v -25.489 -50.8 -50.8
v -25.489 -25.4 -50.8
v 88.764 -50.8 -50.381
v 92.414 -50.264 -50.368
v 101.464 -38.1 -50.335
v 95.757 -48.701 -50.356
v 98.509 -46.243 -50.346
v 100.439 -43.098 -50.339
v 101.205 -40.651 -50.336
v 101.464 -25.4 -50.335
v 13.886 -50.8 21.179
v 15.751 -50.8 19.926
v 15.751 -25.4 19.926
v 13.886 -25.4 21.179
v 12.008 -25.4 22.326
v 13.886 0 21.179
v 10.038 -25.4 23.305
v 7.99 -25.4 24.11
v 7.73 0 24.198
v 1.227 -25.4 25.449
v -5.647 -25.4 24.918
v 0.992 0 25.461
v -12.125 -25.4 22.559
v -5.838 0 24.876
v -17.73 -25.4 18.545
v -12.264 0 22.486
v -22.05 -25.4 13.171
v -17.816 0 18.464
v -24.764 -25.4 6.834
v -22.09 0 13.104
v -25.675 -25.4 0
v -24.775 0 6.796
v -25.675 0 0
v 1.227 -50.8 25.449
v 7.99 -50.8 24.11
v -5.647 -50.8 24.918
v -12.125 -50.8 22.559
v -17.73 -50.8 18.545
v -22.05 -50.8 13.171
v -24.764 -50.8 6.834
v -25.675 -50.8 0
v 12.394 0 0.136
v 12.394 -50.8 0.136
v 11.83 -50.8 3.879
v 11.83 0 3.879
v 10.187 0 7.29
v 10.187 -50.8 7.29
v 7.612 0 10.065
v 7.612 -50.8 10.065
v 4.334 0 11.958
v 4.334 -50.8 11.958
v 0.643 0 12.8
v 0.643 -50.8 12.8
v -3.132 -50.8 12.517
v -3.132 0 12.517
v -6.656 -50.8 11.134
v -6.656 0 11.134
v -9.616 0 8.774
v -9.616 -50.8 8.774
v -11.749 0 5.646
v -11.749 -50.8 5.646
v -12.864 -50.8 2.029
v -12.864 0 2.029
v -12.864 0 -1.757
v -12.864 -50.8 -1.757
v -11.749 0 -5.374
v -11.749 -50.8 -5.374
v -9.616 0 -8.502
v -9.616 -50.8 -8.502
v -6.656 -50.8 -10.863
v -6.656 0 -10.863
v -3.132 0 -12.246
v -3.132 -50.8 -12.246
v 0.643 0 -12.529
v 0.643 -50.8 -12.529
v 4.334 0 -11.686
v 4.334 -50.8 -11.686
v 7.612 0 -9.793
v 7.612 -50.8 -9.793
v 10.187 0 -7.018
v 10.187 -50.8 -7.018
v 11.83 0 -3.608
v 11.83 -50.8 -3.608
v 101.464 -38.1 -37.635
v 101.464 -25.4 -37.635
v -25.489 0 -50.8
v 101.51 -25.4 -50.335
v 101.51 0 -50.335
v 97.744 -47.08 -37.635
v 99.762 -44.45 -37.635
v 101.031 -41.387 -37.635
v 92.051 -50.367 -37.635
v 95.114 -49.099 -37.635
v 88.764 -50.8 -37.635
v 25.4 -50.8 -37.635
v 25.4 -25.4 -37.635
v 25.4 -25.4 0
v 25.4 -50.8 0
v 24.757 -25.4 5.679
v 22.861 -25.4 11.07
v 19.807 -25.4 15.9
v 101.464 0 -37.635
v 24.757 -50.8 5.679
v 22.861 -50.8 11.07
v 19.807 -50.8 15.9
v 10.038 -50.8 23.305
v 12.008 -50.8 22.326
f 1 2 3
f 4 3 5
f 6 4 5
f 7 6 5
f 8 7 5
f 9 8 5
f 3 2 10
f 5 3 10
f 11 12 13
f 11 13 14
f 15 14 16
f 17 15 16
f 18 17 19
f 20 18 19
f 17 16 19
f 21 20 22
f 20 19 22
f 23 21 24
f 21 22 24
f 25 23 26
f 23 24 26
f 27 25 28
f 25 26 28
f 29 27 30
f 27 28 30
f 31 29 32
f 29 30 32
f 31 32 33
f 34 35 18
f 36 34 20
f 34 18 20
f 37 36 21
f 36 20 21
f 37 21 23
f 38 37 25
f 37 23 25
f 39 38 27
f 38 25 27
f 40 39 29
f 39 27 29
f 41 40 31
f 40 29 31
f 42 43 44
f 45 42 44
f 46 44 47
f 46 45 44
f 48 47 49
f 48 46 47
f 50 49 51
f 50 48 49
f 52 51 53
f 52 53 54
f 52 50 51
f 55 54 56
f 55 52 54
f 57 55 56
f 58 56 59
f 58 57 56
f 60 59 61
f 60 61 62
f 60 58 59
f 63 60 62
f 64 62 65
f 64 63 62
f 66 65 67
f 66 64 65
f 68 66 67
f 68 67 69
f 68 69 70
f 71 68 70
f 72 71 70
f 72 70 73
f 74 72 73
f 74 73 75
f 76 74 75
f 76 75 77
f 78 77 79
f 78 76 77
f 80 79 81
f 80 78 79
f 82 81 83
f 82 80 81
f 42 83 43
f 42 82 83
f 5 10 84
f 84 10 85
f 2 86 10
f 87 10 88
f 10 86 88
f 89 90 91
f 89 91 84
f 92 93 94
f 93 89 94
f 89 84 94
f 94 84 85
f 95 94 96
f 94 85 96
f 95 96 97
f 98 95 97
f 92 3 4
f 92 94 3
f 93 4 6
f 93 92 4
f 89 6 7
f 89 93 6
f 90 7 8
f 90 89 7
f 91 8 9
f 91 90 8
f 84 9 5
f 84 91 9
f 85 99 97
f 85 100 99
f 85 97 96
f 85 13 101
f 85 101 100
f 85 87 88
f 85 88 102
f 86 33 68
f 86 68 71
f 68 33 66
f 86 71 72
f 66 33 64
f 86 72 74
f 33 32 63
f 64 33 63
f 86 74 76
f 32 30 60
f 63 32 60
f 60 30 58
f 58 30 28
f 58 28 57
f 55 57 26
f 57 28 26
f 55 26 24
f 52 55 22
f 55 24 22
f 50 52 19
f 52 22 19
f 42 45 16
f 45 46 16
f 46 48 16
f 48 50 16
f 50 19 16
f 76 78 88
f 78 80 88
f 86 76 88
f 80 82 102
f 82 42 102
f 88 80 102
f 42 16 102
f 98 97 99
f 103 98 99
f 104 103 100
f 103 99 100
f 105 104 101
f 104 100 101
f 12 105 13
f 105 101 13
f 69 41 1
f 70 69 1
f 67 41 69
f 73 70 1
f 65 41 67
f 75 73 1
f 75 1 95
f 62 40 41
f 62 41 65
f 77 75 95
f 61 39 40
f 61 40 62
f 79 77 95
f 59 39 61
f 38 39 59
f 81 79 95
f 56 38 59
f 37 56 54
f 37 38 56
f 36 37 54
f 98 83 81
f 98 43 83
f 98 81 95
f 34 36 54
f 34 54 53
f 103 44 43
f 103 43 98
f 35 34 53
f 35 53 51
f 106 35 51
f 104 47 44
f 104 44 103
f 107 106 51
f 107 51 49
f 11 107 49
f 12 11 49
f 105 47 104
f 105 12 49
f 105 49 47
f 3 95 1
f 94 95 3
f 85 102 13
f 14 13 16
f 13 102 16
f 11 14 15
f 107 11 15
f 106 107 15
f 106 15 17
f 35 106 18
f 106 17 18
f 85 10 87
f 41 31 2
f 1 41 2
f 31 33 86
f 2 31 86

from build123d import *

# Parameters (mm, degrees)
F0_R     = 12.7
F1_DEPTH = 25.4
F2_R     = 12.7
F3_DEPTH = 25.4
F4_DEPTH = 25.4
F5_R     = 12.7


with BuildPart() as f1:
    # F0 (on Front) → F1 (new body)
    with BuildSketch(Plane.XZ):
        with BuildLine():
            Line((101.463508, -37.634854), (13.885502, 21.179284))
            ThreePointArc((13.885502, 21.179284), (-12.263588, 22.485844), (-25.675108, 0))
            Line((-25.675108, 0), (-25.489152, -50.79966))
            Line((-25.489152, -50.79966), (101.509997, -50.334769))
            Line((101.509997, -50.334769), (101.463508, -37.634854))
        make_face()
        with Locations((-0.306273, 0.13584)):
            Circle(F0_R, mode=Mode.SUBTRACT)
    extrude(amount=F1_DEPTH)

    # F2 (on face) → F3 (join)
    with BuildSketch(Plane.XZ.offset(25.4)):
        with BuildLine():
            Line((25.4, -37.634854), (25.4, 0))
            ThreePointArc((25.4, 0), (22.860903, 11.069738), (15.751252, 19.926316))
            Line((15.751252, 19.926316), (13.885502, 21.179284))
            ThreePointArc((13.885502, 21.179284), (11.033245, 22.836709), (7.990239, 24.110497))
            ThreePointArc((7.990239, 24.110497), (-15.064639, 20.743276), (-25.675108, 0))
            Line((-25.675108, 0), (-25.535641, -38.099745))
            Line((-25.535641, -38.099745), (-25.489152, -50.79966))
            Line((-25.489152, -50.79966), (101.463508, -50.334939))
            Line((101.463508, -50.334939), (101.463508, -37.634854))
            Line((101.463508, -37.634854), (25.4, -37.634854))
        make_face()
        with Locations((-0.306273, 0.13584)):
            Circle(F2_R, mode=Mode.SUBTRACT)
    extrude(amount=F3_DEPTH)

    # F2 (on face) → F4 (join)
    with BuildSketch(Plane.XZ.offset(25.4)):
        with BuildLine():
            Line((25.4, -37.634854), (25.4, 0))
            ThreePointArc((25.4, 0), (22.860903, 11.069738), (15.751252, 19.926316))
            Line((15.751252, 19.926316), (13.885502, 21.179284))
            ThreePointArc((13.885502, 21.179284), (11.033245, 22.836709), (7.990239, 24.110497))
            ThreePointArc((7.990239, 24.110497), (-15.064639, 20.743276), (-25.675108, 0))
            Line((-25.675108, 0), (-25.535641, -38.099745))
            Line((-25.535641, -38.099745), (-25.489152, -50.79966))
            Line((-25.489152, -50.79966), (101.463508, -50.334939))
            Line((101.463508, -50.334939), (101.463508, -37.634854))
            Line((101.463508, -37.634854), (25.4, -37.634854))
        make_face()
        with Locations((-0.306273, 0.13584)):
            Circle(F2_R, mode=Mode.SUBTRACT)
    extrude(amount=F4_DEPTH)

    # F5
    f5_edges = [f1.edges().sort_by_distance(p)[0] for p in [
        (101.463508, -50.8, -43.984897),
    ]]
    fillet(f5_edges, radius=F5_R)


solid = f1.part
